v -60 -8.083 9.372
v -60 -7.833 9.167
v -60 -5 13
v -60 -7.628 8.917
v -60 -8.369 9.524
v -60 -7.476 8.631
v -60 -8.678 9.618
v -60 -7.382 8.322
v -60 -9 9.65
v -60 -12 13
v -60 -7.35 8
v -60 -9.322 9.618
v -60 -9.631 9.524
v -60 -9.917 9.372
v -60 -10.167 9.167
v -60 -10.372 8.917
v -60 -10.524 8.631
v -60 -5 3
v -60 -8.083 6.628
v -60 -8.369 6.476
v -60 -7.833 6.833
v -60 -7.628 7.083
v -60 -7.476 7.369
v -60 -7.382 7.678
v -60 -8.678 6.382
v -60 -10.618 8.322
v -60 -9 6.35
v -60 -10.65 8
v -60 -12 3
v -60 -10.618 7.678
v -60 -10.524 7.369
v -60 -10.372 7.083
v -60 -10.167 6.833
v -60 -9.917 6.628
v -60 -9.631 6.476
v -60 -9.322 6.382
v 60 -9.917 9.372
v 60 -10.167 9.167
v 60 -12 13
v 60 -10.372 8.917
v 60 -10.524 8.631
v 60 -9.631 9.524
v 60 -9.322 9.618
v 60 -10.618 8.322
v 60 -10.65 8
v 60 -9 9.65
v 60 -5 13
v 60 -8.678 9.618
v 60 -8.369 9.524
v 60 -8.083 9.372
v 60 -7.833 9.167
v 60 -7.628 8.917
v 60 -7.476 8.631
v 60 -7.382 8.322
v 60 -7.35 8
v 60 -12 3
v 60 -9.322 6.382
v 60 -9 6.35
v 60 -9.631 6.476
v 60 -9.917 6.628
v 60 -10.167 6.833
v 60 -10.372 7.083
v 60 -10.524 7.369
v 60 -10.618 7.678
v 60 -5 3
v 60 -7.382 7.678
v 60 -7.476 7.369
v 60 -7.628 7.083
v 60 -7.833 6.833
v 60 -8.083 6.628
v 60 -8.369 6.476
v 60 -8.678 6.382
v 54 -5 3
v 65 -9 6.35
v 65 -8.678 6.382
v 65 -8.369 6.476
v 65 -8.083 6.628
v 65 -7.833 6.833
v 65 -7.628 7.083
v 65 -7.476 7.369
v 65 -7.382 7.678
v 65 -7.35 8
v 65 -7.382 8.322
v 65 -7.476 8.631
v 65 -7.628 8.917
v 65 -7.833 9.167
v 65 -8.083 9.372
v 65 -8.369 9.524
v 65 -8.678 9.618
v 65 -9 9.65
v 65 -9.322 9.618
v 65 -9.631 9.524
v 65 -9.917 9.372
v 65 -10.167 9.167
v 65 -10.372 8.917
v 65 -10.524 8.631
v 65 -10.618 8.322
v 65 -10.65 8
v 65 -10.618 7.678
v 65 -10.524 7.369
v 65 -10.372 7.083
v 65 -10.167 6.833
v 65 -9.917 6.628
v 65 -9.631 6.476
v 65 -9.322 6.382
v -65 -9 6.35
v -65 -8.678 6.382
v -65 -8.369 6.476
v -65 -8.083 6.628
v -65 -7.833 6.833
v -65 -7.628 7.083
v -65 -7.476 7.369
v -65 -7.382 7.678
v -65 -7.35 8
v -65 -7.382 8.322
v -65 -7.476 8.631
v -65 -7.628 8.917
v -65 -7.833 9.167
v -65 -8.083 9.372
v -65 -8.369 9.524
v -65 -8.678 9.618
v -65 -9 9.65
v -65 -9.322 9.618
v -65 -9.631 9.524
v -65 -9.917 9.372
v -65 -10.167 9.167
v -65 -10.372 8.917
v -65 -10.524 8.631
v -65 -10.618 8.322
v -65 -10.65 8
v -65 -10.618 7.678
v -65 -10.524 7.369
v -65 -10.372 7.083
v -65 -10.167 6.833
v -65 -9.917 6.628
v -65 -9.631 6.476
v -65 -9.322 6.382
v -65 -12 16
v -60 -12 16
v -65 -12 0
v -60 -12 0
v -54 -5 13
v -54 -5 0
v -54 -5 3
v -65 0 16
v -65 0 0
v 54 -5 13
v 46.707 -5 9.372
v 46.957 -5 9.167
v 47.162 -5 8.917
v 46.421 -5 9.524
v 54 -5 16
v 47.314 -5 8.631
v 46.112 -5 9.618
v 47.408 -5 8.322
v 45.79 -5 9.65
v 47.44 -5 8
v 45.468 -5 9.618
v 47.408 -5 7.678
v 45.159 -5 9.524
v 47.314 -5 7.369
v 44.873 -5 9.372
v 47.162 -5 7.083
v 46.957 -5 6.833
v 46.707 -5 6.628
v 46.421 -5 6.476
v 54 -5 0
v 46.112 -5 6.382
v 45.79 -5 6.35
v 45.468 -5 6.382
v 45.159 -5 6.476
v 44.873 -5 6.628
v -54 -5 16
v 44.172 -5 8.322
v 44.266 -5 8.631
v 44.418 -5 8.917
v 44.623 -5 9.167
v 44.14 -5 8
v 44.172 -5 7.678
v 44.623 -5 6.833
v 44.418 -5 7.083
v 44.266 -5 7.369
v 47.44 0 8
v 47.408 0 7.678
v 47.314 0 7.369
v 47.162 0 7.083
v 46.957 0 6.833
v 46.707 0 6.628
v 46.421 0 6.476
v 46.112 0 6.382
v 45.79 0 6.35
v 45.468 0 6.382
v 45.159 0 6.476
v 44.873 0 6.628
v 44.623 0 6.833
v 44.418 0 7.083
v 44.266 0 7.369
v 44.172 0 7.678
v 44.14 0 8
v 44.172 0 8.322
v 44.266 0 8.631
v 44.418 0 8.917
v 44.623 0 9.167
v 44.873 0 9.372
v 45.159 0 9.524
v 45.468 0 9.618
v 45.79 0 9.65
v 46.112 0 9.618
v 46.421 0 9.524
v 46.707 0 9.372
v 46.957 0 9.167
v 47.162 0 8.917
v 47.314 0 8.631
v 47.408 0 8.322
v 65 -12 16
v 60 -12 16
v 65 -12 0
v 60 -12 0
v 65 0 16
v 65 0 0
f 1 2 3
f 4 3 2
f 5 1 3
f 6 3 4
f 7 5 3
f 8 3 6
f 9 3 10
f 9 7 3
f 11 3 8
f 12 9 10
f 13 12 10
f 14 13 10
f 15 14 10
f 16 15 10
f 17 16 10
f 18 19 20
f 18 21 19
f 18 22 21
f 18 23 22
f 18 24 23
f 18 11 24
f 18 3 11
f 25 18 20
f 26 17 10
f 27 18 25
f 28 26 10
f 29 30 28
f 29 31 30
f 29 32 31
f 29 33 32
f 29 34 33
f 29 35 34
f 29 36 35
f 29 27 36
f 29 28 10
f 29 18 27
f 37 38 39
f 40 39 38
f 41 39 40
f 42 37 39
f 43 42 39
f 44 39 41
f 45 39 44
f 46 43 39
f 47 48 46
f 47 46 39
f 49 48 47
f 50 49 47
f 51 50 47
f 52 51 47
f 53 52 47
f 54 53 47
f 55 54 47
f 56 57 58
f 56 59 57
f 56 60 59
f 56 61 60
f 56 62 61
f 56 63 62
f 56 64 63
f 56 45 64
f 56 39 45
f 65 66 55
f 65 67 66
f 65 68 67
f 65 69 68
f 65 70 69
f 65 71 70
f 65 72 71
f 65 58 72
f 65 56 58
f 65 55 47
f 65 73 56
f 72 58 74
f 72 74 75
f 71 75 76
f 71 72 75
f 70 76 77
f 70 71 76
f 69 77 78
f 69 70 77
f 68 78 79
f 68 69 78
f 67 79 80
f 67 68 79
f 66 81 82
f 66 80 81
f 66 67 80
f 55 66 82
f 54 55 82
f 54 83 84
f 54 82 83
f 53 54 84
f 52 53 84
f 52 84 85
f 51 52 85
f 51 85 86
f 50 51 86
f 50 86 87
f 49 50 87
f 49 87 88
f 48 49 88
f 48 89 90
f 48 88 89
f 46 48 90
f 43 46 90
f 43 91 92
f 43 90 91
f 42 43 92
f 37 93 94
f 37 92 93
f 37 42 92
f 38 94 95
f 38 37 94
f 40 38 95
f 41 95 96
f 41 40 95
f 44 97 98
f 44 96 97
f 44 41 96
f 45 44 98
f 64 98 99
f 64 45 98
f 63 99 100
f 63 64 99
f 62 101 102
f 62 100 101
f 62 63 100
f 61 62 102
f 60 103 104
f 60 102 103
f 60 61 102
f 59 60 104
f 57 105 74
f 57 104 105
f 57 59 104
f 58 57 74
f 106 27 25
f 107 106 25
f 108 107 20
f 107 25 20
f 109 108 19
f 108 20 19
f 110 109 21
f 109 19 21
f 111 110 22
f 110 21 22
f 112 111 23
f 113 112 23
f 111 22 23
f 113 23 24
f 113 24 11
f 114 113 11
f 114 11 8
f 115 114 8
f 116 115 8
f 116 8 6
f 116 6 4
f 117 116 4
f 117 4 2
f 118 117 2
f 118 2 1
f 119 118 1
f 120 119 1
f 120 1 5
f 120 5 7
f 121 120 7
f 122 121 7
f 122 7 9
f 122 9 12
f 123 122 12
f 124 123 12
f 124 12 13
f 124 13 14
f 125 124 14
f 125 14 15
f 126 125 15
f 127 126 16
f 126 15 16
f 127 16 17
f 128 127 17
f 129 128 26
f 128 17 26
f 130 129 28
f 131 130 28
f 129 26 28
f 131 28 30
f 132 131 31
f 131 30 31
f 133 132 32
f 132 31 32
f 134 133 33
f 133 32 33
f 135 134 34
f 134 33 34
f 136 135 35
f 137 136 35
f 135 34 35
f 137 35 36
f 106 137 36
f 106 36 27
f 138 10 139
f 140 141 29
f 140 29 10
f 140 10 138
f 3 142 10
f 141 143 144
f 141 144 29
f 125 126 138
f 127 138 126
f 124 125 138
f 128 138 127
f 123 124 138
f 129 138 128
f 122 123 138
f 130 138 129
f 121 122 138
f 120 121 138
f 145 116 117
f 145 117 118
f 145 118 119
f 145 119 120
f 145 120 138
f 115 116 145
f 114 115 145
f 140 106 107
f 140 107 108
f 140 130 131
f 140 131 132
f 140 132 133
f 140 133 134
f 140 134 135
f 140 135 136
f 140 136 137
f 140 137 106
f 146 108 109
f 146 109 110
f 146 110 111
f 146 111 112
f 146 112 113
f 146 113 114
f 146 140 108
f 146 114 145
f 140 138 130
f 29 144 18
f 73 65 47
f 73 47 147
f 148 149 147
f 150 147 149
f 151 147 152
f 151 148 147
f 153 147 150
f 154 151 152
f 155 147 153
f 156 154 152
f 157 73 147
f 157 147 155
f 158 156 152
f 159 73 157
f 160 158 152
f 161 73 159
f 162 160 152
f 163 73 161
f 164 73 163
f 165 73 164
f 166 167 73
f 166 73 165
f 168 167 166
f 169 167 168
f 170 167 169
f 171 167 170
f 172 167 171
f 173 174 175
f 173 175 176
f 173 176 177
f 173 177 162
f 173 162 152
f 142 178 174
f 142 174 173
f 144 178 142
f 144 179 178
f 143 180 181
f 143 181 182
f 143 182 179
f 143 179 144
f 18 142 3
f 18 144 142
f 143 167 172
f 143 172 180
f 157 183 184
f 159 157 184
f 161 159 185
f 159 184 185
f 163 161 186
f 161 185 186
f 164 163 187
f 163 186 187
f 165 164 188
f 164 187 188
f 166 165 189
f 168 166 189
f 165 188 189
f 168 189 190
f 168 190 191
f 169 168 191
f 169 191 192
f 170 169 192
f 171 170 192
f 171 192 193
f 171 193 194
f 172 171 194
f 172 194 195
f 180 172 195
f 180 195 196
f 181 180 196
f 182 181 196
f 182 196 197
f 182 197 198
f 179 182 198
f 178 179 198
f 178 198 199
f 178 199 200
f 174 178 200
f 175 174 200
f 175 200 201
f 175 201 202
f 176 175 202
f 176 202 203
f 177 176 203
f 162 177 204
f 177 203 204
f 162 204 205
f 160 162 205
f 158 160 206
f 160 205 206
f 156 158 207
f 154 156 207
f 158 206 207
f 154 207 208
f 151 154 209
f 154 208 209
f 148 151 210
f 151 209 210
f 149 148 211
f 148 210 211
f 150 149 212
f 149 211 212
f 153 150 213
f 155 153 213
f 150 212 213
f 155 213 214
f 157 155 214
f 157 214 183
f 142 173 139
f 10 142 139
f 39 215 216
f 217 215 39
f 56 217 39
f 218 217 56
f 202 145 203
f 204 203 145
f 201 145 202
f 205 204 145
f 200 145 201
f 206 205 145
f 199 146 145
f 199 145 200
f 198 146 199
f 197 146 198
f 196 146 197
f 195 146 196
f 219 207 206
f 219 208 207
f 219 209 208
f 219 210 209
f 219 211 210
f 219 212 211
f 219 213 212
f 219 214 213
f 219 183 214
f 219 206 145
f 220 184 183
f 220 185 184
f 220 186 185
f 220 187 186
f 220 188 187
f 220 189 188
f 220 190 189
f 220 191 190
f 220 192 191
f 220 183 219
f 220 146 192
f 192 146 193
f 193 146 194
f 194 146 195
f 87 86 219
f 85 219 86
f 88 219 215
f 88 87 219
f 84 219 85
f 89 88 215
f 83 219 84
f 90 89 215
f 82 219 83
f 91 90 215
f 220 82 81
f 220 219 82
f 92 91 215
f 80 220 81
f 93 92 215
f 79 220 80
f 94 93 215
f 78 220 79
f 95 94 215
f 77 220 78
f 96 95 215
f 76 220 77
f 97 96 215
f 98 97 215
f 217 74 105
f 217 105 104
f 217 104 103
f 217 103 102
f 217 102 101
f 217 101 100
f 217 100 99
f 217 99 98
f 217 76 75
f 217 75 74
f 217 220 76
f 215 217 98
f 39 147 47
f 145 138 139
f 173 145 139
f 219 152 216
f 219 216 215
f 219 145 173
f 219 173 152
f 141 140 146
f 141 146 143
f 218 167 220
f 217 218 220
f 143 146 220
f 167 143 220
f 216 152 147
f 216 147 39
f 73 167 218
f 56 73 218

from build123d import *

# Parameters (mm, degrees)
EXTRUDE_2_DEPTH          = 16
SKETCH_3_R               = 1.65
CUT_EXTRUDE_1_DEPTH      = 126
CUT_EXTRUDE_1_DEPTH_BACK = 6
EXTRUDE_3_DEPTH          = 3
MIRROR_2_COPY_1_DEPTH    = 3
SKETCH_7_R               = 1.65
CUT_EXTRUDE_2_DEPTH      = 10


with BuildPart() as part:
    # 草图1 → 凸台-拉伸2 (new body)
    with BuildSketch(Plane.XY):
        Polygon((-65, 0), (65, 0), (65, -12), (60, -12), (60, -5), (-60, -5), (-60, -12), (-65, -12), align=None)
    extrude(amount=EXTRUDE_2_DEPTH)

    # 草图3 → 切除-拉伸1 (cut, two sides)
    with BuildSketch(Plane(origin=(-60, 0, 0), x_dir=(0, 0, -1), z_dir=(1, 0, 0))) as cut_extrude_1_sk:
        with Locations((-8, -9)):
            Circle(SKETCH_3_R)
    extrude(amount=CUT_EXTRUDE_1_DEPTH, mode=Mode.SUBTRACT)
    extrude(cut_extrude_1_sk.sketch, amount=-CUT_EXTRUDE_1_DEPTH_BACK, mode=Mode.SUBTRACT)

    # 草图4 → 凸台-拉伸3 (add)
    with BuildSketch(Plane(origin=(0, 0, 0), x_dir=(-1, 0, 0), z_dir=(0, 0, -1))):
        Polygon((54, -5), (60, -12), (60, -5), align=None)
    extrude_3 = extrude(amount=-EXTRUDE_3_DEPTH)

    # 镜向1: 凸台-拉伸3 across plane
    add(extrude_3.mirror(Plane.XY.offset(8)))

    # 镜向2: 凸台-拉伸3 across plane
    add(extrude_3.mirror(Plane(origin=(0, 0, 0), x_dir=(0, 0, 1), z_dir=(1, 0, 0))))

    # 镜向2 copy 1 sketch → 镜向2 copy 1 (add)
    with BuildSketch(Plane.XY.offset(16)):
        Polygon((54, -5), (60, -12), (60, -5), align=None)
    extrude(amount=-MIRROR_2_COPY_1_DEPTH)

    # 草图7 → 切除-拉伸2 (cut)
    with BuildSketch(Plane(origin=(0, 0, 0), x_dir=(1, 0, 0), z_dir=(0, 1, 0))):
        with Locations((45.79, -8)):
            Circle(SKETCH_7_R)
    extrude(amount=-CUT_EXTRUDE_2_DEPTH, mode=Mode.SUBTRACT)


solid = part.part
